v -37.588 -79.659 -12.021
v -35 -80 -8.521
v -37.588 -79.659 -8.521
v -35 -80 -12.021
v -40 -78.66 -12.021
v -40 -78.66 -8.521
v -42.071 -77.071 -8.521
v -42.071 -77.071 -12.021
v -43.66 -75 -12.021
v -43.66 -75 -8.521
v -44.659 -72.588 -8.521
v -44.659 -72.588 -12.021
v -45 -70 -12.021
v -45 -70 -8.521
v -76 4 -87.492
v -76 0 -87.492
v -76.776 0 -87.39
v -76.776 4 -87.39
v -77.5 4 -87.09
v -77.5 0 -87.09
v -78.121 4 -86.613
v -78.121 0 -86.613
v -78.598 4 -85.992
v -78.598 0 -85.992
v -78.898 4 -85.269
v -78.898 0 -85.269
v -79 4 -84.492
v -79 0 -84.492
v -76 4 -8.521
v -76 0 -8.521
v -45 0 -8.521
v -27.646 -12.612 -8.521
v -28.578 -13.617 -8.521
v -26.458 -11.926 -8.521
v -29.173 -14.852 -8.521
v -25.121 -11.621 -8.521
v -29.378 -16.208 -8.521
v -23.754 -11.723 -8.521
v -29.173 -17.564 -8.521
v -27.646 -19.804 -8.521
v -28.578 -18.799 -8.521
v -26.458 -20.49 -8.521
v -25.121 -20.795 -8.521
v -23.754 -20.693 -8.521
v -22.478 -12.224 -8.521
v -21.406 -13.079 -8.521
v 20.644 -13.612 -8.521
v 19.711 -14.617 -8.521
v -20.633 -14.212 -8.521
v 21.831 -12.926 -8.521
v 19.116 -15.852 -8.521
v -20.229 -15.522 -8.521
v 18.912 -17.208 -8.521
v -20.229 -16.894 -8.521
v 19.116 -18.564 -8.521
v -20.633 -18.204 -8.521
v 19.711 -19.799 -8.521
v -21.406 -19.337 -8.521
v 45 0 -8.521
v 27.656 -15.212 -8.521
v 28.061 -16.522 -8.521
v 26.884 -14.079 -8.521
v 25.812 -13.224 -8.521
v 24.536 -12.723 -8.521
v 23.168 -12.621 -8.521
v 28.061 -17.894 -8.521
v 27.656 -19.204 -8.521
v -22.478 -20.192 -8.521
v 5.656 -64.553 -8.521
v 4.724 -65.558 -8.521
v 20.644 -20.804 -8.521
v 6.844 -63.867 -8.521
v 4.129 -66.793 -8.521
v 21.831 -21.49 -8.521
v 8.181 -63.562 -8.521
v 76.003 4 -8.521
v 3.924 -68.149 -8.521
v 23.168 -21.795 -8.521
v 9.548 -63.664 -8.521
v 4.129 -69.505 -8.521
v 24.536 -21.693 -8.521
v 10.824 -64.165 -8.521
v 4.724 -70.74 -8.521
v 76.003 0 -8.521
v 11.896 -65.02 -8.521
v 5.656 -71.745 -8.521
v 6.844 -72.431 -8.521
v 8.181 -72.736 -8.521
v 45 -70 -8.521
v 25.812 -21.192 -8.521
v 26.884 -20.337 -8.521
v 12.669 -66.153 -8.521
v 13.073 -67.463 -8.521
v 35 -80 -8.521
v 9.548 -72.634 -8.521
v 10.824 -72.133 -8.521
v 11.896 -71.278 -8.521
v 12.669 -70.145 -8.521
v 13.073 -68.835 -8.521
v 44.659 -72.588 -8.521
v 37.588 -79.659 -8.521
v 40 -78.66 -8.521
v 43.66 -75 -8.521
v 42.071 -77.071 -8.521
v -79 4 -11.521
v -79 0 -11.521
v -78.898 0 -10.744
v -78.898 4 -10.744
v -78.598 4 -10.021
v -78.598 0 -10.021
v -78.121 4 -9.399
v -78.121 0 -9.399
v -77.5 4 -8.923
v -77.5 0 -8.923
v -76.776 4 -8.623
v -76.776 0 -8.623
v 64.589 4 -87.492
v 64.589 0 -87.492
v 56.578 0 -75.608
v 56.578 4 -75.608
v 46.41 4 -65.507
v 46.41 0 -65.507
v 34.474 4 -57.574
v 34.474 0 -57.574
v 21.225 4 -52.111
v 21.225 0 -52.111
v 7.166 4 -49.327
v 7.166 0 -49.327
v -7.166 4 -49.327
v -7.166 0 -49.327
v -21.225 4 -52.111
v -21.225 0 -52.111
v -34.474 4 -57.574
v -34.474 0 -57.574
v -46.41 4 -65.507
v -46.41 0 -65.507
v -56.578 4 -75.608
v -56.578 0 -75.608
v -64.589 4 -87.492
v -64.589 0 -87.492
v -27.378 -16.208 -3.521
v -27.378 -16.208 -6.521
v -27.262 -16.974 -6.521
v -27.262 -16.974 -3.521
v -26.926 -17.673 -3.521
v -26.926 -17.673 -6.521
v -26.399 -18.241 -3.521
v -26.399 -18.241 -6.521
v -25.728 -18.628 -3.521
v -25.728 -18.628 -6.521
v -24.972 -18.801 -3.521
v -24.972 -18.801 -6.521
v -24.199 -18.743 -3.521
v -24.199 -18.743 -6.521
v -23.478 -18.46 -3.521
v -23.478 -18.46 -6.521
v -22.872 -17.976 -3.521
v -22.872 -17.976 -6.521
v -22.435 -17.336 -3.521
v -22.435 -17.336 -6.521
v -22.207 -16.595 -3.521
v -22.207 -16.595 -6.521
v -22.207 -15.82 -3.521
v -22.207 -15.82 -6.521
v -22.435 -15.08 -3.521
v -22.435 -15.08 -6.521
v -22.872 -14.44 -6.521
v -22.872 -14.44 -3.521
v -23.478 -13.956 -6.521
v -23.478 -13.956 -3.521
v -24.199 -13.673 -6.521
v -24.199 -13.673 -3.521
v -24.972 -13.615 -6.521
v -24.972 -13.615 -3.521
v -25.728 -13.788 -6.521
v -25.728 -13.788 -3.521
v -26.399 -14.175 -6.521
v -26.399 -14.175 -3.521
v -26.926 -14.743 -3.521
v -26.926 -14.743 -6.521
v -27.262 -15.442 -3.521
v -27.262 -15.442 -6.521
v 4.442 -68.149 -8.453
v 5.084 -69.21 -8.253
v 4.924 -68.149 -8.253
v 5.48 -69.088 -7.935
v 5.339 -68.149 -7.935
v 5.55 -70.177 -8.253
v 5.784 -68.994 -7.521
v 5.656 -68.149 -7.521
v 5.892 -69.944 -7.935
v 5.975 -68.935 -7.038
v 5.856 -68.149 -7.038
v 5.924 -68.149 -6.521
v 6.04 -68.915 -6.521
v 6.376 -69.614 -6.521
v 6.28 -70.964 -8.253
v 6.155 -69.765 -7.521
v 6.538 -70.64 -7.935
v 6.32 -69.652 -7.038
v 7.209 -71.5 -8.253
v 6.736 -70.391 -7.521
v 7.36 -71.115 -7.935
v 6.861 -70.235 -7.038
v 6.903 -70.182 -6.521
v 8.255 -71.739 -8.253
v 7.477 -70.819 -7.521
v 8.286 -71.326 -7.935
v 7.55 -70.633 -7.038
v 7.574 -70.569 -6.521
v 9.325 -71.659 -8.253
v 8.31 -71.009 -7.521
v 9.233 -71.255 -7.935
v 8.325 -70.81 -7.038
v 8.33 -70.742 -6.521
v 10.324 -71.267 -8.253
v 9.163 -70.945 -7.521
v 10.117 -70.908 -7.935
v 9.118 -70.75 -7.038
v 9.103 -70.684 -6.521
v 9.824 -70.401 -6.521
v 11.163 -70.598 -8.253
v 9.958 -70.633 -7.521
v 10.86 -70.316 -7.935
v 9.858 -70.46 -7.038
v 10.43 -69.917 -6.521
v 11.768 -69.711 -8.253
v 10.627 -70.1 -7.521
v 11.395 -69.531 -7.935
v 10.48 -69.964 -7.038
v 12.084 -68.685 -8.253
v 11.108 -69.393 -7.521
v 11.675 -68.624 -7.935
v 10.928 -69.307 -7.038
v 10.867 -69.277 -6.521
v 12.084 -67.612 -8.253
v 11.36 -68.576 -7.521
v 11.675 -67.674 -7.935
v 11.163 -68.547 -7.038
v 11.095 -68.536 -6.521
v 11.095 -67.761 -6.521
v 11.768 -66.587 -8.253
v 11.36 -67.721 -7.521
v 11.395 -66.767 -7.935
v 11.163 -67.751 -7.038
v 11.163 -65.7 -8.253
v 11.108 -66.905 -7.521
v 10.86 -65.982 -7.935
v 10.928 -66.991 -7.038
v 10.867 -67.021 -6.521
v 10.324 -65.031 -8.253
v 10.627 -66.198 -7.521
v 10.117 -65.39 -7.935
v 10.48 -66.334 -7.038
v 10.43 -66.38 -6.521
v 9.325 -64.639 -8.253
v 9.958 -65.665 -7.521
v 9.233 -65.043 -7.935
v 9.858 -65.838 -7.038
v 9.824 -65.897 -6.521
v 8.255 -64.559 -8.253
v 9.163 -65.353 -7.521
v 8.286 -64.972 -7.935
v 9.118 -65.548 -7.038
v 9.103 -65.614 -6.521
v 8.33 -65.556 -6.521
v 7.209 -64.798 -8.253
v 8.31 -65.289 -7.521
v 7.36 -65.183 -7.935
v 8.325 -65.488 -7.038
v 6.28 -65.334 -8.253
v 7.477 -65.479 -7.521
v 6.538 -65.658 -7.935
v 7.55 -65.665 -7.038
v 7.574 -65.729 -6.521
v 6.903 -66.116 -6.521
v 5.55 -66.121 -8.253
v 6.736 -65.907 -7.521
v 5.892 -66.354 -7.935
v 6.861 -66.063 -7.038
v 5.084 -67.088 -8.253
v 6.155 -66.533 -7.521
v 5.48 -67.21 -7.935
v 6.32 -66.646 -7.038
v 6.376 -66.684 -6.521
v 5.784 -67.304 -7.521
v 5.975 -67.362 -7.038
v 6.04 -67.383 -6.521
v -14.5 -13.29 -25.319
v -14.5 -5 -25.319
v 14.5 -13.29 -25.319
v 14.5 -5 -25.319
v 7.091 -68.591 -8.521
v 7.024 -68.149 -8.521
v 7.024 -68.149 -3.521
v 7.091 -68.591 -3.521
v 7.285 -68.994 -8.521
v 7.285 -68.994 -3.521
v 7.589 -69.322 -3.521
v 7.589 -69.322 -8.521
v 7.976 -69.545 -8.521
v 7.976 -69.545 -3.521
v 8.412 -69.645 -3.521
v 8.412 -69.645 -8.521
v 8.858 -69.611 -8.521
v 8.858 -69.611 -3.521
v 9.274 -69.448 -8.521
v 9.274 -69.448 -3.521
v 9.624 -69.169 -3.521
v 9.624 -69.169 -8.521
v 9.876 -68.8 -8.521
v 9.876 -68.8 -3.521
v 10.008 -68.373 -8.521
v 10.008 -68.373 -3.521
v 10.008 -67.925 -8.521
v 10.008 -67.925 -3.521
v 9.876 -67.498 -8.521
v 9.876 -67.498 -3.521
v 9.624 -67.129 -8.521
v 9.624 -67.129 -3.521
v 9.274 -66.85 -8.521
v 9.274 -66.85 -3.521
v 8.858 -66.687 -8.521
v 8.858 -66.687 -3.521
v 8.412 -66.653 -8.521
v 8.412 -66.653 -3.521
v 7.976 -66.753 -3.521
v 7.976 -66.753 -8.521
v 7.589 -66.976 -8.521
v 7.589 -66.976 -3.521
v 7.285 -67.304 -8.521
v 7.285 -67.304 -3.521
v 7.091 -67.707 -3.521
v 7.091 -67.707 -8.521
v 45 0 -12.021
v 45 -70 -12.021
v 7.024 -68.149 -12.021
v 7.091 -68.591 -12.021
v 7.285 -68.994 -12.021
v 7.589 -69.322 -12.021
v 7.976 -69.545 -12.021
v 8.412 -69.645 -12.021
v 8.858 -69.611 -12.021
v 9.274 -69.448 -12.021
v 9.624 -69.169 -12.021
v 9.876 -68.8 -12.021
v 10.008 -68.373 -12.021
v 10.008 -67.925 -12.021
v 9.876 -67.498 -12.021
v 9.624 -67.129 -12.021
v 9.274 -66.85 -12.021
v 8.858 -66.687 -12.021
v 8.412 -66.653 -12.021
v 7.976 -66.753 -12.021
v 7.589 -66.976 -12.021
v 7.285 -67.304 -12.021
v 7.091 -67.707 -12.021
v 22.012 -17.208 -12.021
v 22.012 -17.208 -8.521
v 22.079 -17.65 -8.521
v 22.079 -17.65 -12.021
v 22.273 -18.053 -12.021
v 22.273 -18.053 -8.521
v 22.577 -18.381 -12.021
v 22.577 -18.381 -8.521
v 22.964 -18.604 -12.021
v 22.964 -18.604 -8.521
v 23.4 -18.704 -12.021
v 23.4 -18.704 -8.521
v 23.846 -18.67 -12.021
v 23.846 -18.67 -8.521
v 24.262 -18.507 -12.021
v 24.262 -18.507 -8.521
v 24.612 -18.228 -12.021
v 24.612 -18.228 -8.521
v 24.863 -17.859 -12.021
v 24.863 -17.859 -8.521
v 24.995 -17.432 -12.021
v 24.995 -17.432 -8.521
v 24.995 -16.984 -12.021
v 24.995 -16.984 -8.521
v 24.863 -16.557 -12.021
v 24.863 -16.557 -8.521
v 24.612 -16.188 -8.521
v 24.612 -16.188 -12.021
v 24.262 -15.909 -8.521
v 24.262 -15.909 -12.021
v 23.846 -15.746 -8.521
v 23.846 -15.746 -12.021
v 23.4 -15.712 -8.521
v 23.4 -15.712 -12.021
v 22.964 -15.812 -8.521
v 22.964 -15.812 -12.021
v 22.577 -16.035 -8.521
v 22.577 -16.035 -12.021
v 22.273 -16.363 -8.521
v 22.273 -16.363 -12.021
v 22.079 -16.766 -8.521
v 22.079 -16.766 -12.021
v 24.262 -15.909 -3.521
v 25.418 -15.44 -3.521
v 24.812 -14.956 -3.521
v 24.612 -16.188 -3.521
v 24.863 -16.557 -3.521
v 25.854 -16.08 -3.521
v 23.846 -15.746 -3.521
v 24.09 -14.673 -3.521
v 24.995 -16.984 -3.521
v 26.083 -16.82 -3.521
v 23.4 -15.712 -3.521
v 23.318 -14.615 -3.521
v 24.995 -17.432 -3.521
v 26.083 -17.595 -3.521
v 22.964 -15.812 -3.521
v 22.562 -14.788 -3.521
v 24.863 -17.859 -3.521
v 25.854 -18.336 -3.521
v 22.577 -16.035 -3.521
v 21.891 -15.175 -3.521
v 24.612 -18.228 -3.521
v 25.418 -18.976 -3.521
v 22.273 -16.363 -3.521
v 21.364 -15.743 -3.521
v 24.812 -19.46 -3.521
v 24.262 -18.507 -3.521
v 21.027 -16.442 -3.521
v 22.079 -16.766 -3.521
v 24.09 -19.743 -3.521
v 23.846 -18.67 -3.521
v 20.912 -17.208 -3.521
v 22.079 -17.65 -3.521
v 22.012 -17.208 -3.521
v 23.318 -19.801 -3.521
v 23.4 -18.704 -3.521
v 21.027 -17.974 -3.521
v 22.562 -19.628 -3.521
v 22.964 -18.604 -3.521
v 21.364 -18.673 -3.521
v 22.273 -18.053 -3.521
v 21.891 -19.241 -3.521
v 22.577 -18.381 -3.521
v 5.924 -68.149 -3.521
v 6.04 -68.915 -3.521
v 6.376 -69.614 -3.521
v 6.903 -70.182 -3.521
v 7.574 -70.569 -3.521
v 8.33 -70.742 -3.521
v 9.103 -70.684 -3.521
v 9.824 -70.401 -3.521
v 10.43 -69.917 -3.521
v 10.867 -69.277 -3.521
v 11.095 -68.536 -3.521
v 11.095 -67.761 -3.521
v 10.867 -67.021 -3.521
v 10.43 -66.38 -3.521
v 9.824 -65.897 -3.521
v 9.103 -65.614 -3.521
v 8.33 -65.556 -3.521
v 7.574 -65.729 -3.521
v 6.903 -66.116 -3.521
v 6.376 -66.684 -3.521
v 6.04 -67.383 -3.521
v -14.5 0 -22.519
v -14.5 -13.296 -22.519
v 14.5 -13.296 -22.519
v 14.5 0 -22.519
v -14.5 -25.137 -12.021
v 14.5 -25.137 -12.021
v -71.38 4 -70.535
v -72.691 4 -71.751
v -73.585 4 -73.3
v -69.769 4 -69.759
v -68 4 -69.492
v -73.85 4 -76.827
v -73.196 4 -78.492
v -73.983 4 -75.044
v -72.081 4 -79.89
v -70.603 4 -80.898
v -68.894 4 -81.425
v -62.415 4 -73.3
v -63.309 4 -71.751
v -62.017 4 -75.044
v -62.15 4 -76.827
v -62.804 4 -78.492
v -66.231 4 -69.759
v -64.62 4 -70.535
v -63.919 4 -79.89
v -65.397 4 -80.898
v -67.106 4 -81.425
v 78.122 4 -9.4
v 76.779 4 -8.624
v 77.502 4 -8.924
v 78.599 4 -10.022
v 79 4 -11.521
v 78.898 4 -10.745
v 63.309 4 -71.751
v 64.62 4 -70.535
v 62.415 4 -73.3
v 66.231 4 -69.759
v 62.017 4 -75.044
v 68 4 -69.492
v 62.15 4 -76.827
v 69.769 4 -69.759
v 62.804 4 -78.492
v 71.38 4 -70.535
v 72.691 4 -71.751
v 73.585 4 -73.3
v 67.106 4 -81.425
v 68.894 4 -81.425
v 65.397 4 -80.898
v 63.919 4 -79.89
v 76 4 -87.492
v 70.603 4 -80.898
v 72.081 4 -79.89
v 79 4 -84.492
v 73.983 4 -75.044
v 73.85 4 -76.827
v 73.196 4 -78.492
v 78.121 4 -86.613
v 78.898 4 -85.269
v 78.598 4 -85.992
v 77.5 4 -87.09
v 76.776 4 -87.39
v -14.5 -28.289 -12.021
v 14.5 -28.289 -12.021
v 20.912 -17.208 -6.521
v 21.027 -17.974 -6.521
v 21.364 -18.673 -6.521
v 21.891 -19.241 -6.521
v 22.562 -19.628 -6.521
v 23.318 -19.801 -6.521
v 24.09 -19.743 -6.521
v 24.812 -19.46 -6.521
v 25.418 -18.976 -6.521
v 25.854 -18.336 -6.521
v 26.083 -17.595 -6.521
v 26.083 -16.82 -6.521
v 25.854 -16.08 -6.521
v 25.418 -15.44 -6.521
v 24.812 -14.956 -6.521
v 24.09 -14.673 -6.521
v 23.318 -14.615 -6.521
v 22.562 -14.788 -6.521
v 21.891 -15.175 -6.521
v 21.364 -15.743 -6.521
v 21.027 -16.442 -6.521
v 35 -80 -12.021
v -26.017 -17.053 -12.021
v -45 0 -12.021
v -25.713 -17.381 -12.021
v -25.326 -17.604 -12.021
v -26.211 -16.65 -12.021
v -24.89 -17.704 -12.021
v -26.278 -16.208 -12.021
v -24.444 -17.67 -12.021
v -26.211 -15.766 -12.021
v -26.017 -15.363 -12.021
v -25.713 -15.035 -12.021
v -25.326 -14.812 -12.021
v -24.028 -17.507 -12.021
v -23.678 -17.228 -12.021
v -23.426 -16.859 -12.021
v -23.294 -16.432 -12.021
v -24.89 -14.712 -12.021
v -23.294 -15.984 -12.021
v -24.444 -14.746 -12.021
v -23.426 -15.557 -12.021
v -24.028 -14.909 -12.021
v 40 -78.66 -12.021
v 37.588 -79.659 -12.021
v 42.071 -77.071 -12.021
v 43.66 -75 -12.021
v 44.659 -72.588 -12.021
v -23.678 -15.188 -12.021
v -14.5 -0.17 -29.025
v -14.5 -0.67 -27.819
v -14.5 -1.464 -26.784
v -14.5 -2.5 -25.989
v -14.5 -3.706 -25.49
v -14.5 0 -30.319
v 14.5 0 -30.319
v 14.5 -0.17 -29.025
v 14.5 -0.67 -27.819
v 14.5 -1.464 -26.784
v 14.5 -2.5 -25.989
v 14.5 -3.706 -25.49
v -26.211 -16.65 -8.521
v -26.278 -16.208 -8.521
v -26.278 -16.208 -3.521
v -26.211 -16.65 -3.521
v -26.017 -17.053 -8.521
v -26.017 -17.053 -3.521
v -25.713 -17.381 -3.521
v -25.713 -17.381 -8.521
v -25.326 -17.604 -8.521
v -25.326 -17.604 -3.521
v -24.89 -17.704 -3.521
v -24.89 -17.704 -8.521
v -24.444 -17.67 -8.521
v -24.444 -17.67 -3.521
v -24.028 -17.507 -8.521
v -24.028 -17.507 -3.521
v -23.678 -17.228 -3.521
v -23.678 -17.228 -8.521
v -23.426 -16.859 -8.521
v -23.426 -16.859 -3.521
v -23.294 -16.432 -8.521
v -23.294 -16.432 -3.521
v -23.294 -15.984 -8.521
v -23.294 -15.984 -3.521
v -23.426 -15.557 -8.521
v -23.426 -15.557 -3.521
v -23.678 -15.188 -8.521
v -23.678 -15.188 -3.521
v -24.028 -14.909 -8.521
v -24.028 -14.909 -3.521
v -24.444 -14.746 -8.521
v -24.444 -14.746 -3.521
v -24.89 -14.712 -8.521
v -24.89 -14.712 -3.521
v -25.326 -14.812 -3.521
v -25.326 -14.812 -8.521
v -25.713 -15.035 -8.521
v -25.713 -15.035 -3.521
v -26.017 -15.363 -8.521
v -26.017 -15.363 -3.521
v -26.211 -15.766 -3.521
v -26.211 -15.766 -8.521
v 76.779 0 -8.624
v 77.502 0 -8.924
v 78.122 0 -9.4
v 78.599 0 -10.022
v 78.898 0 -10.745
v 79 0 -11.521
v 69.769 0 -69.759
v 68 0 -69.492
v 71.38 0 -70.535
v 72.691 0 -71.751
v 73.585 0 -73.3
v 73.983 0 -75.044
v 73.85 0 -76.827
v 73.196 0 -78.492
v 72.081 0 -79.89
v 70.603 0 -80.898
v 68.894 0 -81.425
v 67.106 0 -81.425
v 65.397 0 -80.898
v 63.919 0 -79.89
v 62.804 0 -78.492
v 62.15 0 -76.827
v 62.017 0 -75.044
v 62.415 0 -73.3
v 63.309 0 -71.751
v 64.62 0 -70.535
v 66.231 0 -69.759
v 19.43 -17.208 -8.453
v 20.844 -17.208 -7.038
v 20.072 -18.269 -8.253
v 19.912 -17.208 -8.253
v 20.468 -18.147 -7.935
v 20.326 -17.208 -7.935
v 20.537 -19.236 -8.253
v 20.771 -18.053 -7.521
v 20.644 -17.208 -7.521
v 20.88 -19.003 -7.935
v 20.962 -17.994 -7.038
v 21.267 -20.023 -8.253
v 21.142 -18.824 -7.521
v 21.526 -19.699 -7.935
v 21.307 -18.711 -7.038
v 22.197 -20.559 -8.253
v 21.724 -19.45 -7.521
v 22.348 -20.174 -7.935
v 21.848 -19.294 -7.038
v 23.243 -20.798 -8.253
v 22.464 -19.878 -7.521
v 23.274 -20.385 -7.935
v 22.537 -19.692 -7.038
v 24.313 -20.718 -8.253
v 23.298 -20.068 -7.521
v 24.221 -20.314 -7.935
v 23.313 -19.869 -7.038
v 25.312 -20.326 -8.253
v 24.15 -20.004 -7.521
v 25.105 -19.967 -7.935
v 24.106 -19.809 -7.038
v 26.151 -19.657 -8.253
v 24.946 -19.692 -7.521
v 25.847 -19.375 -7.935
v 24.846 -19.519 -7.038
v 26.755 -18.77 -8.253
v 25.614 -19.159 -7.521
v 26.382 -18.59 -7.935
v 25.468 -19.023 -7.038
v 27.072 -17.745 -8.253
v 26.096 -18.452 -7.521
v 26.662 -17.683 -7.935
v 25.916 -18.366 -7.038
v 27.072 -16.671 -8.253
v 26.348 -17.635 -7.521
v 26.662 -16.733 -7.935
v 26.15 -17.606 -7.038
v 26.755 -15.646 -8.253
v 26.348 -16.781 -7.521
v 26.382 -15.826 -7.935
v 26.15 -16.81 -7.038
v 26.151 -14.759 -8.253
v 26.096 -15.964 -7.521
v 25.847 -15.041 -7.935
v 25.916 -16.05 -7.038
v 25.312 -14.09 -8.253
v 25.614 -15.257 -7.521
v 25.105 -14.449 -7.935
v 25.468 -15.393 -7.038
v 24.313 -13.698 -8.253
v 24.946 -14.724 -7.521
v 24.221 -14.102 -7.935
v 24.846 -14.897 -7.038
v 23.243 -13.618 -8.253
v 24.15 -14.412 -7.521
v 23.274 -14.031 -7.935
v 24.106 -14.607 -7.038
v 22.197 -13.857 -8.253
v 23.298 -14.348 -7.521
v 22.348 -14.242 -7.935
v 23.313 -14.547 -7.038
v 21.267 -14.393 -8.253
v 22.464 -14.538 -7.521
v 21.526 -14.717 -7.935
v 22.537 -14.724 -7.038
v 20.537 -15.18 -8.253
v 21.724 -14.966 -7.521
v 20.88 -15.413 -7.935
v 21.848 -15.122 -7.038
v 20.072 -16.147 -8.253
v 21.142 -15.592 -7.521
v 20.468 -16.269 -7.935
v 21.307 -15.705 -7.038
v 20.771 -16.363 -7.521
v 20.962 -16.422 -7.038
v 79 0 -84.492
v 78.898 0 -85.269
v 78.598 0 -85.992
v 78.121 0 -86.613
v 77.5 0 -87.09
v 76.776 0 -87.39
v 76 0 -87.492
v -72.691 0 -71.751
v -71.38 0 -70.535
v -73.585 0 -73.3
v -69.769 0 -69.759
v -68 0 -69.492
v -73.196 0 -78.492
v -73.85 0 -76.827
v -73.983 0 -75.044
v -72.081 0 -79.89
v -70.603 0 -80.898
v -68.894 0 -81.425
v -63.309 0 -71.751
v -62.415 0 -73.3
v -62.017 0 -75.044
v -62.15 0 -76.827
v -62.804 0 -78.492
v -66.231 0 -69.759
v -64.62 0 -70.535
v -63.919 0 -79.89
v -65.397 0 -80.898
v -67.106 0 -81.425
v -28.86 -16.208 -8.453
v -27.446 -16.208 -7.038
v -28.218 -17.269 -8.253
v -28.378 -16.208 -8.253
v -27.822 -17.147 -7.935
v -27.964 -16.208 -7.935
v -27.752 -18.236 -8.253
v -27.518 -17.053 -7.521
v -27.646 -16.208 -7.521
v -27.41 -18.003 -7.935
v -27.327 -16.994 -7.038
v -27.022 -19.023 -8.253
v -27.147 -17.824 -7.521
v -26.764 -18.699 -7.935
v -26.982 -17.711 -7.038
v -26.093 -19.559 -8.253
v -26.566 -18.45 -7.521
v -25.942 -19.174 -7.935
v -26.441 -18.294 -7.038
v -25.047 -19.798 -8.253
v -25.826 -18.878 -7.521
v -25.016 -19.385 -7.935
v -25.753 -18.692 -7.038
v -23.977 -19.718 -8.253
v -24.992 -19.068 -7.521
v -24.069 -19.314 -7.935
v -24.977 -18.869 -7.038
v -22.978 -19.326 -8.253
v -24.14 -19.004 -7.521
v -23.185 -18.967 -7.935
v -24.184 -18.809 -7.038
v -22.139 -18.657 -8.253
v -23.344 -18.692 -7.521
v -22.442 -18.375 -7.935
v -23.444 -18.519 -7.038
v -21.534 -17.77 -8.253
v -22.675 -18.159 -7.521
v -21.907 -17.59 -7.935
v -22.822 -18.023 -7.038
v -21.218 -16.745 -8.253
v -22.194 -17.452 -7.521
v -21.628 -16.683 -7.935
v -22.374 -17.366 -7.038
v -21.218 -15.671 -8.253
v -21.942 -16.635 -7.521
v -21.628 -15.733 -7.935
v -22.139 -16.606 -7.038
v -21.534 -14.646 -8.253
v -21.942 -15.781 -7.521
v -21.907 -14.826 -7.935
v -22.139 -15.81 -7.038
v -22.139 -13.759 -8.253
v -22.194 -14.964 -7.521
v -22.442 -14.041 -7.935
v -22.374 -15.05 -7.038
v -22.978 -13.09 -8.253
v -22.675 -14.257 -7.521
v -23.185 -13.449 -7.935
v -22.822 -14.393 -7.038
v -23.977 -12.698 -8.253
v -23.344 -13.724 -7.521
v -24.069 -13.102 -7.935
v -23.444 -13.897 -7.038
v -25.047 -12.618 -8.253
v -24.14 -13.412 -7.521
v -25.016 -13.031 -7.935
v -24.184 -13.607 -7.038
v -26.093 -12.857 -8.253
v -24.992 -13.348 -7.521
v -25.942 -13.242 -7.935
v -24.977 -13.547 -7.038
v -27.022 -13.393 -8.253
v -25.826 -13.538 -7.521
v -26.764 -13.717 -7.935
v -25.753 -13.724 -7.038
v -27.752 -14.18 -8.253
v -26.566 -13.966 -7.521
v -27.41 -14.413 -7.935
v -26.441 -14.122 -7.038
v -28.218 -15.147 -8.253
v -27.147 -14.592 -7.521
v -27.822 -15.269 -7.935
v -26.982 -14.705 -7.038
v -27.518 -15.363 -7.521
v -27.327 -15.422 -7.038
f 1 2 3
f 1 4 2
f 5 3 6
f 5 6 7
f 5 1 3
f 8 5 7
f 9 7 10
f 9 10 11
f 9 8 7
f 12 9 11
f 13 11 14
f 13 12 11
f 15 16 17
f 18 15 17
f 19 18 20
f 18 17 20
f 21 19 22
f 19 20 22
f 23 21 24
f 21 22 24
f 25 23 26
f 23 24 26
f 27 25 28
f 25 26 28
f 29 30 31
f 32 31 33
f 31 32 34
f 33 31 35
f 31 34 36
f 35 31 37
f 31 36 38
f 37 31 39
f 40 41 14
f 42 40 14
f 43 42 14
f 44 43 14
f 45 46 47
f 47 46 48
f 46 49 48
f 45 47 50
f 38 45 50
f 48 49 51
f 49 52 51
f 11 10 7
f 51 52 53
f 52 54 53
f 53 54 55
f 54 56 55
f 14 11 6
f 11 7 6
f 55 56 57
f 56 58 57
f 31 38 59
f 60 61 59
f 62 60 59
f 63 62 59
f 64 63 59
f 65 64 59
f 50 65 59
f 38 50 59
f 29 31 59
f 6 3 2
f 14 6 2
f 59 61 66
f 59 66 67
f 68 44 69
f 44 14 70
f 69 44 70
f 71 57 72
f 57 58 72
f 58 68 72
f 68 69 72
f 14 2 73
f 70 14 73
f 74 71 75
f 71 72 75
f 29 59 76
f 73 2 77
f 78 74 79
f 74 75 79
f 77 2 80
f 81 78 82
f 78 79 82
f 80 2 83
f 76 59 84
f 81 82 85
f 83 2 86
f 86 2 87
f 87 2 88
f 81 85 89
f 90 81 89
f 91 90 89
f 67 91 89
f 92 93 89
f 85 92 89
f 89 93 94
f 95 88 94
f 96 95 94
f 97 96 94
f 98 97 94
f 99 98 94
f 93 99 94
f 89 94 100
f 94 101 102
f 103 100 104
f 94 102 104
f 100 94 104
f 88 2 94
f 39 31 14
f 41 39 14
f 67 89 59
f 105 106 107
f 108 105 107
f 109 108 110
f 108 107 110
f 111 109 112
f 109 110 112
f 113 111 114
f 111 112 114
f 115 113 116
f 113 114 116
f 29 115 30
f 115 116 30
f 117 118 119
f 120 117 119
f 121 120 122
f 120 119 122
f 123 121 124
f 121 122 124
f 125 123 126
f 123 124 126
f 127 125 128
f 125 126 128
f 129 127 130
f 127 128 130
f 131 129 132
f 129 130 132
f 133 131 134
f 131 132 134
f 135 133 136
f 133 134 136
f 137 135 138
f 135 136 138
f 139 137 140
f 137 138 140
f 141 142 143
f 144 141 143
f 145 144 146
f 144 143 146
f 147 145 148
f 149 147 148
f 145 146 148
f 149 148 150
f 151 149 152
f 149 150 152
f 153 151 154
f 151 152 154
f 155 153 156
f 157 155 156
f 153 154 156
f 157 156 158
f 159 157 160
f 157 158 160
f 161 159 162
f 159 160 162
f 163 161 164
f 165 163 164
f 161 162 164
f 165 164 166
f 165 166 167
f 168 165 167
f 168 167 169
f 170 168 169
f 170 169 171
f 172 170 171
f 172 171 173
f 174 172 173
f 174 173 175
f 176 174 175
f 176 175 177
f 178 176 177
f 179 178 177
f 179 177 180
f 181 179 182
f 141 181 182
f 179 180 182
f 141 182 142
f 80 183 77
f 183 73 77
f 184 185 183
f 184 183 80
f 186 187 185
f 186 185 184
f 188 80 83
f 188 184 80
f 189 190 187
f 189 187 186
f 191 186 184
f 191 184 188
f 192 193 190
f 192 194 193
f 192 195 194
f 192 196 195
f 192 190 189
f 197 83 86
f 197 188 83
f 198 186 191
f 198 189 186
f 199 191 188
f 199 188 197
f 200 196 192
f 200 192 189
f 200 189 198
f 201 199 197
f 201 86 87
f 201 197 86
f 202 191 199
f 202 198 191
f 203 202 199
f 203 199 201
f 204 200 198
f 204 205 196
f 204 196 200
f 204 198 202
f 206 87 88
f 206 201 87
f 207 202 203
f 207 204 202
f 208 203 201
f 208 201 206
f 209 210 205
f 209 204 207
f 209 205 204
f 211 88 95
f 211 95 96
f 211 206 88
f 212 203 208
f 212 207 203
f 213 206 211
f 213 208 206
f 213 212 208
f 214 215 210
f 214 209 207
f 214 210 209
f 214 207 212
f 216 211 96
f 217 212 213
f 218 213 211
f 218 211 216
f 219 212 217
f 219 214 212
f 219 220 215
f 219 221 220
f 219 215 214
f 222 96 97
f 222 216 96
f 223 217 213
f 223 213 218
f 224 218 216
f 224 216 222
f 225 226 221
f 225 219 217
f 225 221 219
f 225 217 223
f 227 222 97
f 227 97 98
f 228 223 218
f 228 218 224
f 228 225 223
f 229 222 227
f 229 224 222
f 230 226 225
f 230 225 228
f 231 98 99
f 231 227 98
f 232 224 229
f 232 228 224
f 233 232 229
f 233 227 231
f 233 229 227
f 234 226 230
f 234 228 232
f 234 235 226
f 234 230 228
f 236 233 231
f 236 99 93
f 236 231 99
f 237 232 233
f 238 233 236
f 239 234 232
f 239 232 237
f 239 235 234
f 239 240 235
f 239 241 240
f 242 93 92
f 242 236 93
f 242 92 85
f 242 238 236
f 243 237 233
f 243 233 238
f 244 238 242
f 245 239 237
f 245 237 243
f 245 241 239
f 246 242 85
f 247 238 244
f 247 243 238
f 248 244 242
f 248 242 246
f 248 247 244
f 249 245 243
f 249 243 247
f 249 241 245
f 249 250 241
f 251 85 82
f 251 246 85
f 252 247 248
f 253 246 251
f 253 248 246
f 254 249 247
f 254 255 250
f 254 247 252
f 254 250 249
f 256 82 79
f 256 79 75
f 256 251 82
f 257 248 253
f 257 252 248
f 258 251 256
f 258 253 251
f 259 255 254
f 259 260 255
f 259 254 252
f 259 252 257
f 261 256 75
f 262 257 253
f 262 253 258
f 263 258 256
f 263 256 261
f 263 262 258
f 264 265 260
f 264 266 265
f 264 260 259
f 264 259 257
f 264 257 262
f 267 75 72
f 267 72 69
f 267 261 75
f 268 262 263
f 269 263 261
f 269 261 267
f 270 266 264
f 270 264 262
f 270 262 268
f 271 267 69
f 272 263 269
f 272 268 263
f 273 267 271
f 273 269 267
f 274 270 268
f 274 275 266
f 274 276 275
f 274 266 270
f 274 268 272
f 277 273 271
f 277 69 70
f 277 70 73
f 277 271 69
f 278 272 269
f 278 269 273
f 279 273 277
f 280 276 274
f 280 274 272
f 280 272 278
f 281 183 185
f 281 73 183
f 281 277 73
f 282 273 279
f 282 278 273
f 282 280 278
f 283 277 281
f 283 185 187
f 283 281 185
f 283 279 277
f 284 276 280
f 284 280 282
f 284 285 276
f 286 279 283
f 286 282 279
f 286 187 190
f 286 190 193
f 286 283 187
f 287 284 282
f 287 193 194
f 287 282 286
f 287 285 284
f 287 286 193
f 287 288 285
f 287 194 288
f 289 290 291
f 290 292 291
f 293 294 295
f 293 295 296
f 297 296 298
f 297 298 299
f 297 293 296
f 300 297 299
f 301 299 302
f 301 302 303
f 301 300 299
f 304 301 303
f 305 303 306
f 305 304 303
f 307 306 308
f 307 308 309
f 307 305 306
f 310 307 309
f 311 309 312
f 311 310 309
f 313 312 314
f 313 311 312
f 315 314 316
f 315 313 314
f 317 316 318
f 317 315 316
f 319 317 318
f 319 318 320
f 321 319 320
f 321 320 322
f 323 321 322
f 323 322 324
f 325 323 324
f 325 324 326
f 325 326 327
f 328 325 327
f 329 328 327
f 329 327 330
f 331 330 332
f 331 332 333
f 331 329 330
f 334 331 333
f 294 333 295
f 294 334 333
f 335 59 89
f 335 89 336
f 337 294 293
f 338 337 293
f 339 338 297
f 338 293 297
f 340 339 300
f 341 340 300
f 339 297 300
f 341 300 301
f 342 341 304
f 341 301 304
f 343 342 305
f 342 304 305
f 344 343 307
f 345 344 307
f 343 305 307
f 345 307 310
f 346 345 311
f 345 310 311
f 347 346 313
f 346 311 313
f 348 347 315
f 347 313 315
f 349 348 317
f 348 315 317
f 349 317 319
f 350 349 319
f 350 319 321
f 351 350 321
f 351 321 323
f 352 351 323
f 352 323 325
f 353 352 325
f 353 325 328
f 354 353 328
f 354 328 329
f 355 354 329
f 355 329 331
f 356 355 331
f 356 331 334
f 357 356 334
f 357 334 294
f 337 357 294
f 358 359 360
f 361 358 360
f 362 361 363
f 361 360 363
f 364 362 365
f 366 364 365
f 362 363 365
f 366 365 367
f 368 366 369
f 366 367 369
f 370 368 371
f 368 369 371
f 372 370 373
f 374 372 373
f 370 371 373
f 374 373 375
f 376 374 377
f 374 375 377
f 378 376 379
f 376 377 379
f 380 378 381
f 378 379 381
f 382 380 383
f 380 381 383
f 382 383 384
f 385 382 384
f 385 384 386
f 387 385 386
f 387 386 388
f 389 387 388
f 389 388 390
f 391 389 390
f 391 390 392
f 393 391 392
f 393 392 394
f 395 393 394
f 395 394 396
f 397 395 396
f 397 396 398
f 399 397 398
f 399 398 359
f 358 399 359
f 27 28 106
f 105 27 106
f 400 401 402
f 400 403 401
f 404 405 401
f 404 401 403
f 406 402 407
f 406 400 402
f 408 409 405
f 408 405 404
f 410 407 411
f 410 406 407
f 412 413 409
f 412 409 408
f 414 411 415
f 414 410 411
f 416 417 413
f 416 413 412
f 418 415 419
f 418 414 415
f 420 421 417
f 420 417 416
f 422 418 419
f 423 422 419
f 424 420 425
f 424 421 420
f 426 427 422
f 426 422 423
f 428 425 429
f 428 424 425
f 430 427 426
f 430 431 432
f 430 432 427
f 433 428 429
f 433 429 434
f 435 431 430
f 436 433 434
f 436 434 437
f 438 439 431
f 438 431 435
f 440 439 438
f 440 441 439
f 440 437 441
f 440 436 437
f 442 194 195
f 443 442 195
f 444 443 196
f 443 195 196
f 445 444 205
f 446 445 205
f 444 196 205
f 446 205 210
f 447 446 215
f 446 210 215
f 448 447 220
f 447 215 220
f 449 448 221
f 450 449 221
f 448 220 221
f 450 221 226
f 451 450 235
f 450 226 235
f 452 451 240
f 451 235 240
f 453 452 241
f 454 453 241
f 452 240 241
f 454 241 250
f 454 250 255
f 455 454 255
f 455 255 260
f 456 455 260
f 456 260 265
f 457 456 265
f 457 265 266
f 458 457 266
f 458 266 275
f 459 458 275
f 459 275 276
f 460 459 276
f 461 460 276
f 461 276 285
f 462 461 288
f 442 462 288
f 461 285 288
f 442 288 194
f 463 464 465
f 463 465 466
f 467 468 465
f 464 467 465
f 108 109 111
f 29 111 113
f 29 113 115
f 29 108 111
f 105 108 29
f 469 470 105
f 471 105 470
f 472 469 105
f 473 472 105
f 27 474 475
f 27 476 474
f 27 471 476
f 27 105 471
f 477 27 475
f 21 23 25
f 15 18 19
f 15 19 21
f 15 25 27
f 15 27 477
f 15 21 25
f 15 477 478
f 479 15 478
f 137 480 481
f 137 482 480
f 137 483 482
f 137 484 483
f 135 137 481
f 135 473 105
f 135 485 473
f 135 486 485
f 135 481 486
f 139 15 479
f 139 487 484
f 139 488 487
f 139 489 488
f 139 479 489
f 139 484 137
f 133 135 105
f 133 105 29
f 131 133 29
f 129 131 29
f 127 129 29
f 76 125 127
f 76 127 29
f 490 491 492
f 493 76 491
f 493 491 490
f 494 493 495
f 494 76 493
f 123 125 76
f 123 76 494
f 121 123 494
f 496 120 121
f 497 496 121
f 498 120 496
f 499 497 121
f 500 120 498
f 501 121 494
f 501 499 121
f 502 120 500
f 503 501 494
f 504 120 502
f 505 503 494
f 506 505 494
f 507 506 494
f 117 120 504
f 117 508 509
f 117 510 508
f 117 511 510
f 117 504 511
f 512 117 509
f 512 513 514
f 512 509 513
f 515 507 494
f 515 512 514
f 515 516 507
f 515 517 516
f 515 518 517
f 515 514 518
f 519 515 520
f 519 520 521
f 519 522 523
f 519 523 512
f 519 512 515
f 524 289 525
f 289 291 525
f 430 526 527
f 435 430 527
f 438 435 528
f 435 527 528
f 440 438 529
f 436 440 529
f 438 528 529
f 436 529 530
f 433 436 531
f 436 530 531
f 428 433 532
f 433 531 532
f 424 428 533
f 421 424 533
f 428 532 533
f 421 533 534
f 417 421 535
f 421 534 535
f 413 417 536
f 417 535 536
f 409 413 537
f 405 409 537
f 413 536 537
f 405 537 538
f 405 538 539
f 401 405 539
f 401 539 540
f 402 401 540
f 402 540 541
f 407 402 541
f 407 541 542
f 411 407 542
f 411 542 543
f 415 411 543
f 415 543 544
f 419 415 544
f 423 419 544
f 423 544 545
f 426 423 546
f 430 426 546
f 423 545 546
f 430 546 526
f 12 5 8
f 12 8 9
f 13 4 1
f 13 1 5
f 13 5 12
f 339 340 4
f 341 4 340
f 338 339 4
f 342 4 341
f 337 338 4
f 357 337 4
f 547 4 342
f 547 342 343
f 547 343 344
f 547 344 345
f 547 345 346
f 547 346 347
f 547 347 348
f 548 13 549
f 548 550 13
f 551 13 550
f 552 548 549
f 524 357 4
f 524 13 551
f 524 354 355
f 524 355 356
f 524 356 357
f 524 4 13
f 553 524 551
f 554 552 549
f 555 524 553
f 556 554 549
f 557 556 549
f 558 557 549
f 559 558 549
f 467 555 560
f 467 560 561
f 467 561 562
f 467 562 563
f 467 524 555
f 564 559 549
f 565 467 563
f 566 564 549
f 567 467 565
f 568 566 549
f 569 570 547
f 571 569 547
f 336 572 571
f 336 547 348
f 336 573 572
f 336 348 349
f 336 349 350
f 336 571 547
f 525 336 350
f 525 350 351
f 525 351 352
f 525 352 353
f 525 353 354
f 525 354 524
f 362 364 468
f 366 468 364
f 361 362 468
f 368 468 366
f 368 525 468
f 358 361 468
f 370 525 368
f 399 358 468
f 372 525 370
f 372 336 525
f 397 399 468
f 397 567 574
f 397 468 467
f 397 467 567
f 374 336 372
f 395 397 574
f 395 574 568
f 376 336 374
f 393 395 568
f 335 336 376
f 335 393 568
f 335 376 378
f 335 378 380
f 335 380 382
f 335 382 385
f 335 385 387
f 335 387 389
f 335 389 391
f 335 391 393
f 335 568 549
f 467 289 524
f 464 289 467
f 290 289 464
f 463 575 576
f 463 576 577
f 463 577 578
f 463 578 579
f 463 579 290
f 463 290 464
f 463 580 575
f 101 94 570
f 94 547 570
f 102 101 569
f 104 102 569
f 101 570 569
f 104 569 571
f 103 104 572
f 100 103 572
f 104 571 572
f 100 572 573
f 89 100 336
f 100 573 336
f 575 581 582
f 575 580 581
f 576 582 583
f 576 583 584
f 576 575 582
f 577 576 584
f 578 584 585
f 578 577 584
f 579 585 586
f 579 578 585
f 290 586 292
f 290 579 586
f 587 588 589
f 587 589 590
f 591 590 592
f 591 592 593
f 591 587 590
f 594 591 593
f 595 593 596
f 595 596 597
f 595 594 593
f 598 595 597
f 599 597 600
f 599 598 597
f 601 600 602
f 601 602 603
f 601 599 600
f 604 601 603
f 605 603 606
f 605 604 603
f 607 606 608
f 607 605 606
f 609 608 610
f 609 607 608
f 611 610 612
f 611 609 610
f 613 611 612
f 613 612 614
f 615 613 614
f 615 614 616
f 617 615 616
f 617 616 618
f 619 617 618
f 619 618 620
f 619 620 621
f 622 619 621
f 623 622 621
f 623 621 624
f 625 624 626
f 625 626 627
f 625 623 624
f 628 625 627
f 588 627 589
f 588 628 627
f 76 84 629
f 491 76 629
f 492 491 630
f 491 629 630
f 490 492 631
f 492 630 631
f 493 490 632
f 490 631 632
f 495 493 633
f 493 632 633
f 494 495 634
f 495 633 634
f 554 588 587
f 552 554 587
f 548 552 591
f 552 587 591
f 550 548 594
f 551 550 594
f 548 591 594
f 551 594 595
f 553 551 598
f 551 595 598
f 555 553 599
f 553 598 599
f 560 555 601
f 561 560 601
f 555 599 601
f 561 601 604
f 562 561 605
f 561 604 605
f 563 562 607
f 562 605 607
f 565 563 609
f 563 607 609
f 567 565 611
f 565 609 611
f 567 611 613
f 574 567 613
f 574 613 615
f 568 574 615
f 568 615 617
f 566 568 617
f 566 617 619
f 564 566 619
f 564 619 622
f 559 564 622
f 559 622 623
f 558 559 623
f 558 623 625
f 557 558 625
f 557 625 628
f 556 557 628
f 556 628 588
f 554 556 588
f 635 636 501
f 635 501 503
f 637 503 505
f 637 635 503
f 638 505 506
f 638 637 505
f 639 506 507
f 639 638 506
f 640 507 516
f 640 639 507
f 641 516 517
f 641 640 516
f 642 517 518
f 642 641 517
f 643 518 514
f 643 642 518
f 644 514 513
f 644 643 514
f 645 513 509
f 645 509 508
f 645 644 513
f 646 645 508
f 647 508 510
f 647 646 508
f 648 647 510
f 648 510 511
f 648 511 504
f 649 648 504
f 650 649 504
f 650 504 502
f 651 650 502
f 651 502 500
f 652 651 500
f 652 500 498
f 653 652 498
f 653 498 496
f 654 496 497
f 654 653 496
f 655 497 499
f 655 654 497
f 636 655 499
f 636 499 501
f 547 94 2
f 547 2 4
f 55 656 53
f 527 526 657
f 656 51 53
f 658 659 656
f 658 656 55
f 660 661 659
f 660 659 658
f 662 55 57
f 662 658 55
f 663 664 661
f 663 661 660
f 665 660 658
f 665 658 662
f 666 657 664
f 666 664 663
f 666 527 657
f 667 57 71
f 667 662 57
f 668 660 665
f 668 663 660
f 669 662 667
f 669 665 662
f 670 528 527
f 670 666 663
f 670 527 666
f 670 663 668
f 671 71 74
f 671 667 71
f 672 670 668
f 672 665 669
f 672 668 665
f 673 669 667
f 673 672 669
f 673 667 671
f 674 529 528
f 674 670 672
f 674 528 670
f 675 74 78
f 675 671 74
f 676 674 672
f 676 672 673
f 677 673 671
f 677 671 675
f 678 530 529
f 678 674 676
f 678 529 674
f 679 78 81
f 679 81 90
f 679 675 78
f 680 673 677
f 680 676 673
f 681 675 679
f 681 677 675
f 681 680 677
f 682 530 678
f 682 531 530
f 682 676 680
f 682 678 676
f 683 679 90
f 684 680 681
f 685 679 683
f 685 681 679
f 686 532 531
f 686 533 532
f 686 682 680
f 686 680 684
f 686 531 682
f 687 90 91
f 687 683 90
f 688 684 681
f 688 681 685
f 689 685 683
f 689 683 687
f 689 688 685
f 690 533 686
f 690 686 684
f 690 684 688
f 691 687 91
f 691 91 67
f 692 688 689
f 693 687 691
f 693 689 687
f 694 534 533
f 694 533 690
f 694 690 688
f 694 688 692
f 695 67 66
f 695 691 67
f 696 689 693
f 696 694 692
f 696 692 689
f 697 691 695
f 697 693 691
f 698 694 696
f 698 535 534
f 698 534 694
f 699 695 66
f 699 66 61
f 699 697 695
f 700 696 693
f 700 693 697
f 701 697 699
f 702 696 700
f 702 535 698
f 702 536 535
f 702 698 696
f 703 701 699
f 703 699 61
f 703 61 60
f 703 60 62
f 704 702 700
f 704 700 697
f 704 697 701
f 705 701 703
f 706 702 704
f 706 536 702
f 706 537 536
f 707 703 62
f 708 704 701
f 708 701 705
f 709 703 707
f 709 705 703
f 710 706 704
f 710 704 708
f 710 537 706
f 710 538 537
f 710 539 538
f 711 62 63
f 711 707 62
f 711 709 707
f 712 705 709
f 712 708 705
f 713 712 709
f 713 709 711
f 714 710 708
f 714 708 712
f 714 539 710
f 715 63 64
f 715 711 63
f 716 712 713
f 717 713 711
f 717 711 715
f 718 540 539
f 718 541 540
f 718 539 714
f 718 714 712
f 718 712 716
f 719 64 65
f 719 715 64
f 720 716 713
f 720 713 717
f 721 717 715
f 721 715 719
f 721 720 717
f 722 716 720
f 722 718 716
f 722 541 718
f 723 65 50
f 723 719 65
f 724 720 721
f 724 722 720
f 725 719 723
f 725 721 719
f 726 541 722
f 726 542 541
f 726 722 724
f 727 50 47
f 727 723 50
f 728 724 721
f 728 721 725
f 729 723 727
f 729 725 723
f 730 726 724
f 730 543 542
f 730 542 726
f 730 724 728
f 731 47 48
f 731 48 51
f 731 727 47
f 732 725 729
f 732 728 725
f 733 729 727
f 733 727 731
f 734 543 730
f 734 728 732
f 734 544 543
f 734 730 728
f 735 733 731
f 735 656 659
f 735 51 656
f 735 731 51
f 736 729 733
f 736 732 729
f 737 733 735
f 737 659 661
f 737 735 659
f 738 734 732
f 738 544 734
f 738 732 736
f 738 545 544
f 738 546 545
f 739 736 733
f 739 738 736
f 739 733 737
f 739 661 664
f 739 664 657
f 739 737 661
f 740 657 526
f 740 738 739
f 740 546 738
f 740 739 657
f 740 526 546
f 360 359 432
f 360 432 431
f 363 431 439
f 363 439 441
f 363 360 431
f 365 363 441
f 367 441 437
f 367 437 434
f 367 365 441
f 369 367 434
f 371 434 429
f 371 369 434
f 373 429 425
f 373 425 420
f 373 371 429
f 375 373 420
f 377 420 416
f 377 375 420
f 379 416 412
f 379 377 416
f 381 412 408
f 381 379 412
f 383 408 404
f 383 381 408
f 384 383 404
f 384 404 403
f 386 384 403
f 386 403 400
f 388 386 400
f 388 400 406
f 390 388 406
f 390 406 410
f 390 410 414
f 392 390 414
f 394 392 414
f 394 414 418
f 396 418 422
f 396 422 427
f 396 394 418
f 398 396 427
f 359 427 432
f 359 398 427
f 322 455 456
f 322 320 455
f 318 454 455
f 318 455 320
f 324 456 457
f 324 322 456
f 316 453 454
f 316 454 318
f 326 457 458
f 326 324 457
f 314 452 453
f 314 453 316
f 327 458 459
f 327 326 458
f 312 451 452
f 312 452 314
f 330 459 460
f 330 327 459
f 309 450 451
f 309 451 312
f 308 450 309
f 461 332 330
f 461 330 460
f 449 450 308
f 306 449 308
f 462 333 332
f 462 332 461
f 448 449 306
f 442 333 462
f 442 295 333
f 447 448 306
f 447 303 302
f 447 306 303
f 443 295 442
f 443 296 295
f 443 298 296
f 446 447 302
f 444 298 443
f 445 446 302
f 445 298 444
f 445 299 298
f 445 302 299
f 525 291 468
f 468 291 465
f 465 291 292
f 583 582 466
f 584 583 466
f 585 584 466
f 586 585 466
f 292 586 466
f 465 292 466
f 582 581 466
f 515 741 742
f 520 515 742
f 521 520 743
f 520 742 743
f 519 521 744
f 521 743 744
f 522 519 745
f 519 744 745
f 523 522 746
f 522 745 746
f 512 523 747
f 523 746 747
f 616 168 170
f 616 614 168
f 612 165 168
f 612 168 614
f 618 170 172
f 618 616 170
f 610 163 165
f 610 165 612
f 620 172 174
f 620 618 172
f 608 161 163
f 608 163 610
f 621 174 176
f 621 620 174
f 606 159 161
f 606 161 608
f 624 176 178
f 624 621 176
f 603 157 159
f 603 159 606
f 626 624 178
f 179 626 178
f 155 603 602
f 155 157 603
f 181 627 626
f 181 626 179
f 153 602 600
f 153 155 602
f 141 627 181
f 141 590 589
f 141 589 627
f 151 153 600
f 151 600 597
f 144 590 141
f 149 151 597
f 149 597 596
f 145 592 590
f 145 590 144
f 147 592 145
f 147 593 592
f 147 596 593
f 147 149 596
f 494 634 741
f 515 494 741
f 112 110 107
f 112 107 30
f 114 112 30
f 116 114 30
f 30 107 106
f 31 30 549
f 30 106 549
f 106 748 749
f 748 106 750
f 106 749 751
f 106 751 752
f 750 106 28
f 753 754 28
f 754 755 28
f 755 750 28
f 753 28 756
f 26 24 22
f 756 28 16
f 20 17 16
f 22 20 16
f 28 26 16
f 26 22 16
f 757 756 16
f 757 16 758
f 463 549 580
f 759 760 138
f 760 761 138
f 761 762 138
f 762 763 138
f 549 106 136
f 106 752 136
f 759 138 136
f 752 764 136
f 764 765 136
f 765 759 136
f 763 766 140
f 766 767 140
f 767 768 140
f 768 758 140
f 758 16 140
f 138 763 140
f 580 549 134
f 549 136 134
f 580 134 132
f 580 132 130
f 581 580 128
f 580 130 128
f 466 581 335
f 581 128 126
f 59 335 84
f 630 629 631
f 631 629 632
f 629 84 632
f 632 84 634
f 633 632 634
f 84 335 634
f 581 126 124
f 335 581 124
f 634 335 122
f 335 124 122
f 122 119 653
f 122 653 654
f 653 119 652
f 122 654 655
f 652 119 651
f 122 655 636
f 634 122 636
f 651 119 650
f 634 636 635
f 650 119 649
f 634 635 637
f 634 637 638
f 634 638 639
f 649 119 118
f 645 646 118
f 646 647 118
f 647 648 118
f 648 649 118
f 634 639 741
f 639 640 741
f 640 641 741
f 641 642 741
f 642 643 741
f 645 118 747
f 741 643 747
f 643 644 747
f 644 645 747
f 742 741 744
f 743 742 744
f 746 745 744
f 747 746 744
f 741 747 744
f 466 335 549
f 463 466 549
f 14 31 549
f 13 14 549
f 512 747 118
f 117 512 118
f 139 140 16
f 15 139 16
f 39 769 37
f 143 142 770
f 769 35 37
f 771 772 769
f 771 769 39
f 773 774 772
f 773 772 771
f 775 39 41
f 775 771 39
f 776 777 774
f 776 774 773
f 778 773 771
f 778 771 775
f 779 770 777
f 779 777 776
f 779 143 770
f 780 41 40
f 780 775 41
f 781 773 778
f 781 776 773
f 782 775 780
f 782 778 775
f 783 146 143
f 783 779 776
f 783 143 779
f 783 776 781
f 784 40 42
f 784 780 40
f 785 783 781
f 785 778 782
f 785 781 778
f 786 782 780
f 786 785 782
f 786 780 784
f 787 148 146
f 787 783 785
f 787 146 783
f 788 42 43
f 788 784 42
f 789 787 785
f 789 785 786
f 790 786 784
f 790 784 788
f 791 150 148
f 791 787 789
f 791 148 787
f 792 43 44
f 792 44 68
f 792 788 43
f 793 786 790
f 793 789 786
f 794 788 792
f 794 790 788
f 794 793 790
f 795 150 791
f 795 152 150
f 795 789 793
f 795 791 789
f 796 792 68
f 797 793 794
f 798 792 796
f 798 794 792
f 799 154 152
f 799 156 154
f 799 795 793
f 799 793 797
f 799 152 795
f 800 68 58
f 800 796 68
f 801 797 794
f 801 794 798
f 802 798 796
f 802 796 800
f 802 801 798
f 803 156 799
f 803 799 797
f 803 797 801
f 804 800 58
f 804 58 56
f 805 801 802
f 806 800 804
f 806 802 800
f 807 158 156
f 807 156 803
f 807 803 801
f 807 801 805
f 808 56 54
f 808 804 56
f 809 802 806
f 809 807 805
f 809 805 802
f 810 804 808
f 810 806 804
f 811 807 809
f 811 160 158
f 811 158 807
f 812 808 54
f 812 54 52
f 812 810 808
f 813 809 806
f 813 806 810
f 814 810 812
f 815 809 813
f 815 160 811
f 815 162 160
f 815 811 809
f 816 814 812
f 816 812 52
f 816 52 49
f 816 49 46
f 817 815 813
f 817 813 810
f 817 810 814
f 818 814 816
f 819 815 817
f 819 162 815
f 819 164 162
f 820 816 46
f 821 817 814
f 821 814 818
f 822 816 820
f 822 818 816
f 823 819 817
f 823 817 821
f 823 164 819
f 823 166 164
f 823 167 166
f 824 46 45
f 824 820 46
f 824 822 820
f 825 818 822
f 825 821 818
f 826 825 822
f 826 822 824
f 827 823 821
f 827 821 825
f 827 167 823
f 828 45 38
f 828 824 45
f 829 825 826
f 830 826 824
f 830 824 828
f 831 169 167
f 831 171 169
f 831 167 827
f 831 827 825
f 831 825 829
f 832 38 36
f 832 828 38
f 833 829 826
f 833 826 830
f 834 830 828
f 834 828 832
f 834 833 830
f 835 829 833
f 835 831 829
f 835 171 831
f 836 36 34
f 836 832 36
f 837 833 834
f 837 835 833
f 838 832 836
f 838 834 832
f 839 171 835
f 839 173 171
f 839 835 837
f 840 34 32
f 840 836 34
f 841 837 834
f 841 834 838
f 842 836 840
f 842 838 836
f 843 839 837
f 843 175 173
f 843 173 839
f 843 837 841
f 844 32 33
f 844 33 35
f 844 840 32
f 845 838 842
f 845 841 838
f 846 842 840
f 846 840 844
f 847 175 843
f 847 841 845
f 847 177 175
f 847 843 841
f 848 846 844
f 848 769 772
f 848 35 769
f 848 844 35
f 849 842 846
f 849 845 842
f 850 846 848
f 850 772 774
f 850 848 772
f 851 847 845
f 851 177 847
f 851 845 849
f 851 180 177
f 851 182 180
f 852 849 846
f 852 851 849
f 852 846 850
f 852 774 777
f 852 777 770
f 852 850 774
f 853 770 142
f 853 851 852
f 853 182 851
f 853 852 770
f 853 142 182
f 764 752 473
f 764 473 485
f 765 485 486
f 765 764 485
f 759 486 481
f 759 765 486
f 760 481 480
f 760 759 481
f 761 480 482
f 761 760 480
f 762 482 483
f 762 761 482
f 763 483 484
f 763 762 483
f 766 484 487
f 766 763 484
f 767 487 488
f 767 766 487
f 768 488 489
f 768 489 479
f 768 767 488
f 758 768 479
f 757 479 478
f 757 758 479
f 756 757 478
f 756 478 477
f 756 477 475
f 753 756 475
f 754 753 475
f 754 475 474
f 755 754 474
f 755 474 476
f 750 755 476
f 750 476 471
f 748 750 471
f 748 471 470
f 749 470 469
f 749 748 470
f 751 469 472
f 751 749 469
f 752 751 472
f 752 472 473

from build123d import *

# Parameters (mm, degrees)
SKETCH_217_R        = 6
EXTRUDE_1_DEPTH     = 4
SKETCH_2_W          = 3.5
SKETCH_2_H          = 80
EXTRUDE_3_DEPTH     = 45
EXTRUDE_4_DEPTH     = 14.5
SKETCH_10_R         = 2.6
SKETCH_10_R_2       = 1.5
EXTRUDE_5_DEPTH     = 5
FILLET_1_R          = 2
FILLET_2_R          = 2
FILLET_3_R          = 10
FILLET_4_R          = 10
FILLET_5_R          = 5
SKETCH_12_R         = 1.5
CUT_EXTRUDE_1_DEPTH = 5


with BuildPart() as part:
    # Sketch 217 → 凸台-拉伸1 (new body)
    with BuildSketch(Plane(origin=(0, 0, 0), x_dir=(1, 0, 0), z_dir=(0, 1, 0))):
        with BuildLine():
            Line((79, 11.520697427), (79, 84.492095777))
            ThreePointArc((79, 84.492095777), (78.121320344, 86.613416121), (76, 87.492095777))
            Line((76, 87.492095777), (64.588699332, 87.492095777))
            ThreePointArc((64.588699332, 87.492095777), (0, 48.976277018), (-64.588699332, 87.492095777))
            Line((-64.588699332, 87.492095777), (-76, 87.492095777))
            ThreePointArc((-76, 87.492095777), (-78.121320344, 86.613416121), (-79, 84.492095777))
            Line((-79, 84.492095777), (-79, 11.520698809))
            ThreePointArc((-79, 11.520698809), (-78.121320344, 9.399378465), (-76, 8.520698809))
            Line((-76, 8.520698809), (76.002879086, 8.520698809))
            ThreePointArc((76.002879086, 8.520698809), (78.12233801, 9.400395239), (79, 11.520697427))
        make_face()
        with Locations(Location((68, 75.492095777, 0), (0, 0, 270))):  # turned: the seam where the file's is
            Circle(SKETCH_217_R, mode=Mode.SUBTRACT)
        with Locations(Location((-68, 75.492095777, 0), (0, 0, 270))):  # turned: the seam where the file's is
            Circle(SKETCH_217_R, mode=Mode.SUBTRACT)
    extrude(amount=EXTRUDE_1_DEPTH)

    # 草图2 → 凸台-拉伸3 (add, symmetric)
    with BuildSketch(Plane(origin=(0, 0, 0), x_dir=(0, 0, -1), z_dir=(1, 0, 0))):
        with Locations((10.270698809, -40)):
            Rectangle(SKETCH_2_W, SKETCH_2_H)
    extrude(amount=EXTRUDE_3_DEPTH, both=True)

    # 草图11 → 凸台-拉伸4 (add, symmetric)
    with BuildSketch(Plane(origin=(0, 0, 0), x_dir=(0, 0, -1), z_dir=(1, 0, 0))):
        Polygon((22.519495234, 0), (25.319495234, 0), (25.319495234, -13.290347232), (12.020698809, -28.288925016), (12.020698809, -25.13708489), (22.519495234, -13.2963882), align=None)
    extrude(amount=EXTRUDE_4_DEPTH, both=True)

    # 草图10 → 凸台-拉伸5 (add)
    with BuildSketch(Plane.XY.offset(-8.520698809)):
        with Locations(Location((23.511926173, -17.207974392, 0), (0, 0, 180))):  # turned: the seam where the file's is
            Circle(SKETCH_10_R)
        with Locations(Location((23.511926173, -17.207974392, 0), (0, 0, 180))):  # turned: the seam where the file's is
            Circle(SKETCH_10_R_2, mode=Mode.SUBTRACT)
        with Locations(Location((-24.77772075, -16.207974392, 0), (0, 0, 180))):  # turned: the seam where the file's is
            Circle(SKETCH_10_R)
        with Locations(Location((-24.77772075, -16.207974392, 0), (0, 0, 180))):  # turned: the seam where the file's is
            Circle(SKETCH_10_R_2, mode=Mode.SUBTRACT)
        with Locations(Location((8.524325101, -68.1489384, 0), (0, 0, 180))):  # turned: the seam where the file's is
            Circle(SKETCH_10_R)
        with Locations(Location((8.524325101, -68.1489384, 0), (0, 0, 180))):  # turned: the seam where the file's is
            Circle(SKETCH_10_R_2, mode=Mode.SUBTRACT)
    extrude(amount=EXTRUDE_5_DEPTH)

    # 圆角1
    fillet_1_edges = [part.edges().sort_by_distance(p)[0] for p in [
        (11.124325101, -68.1489384, -8.520698809),
    ]]
    fillet(fillet_1_edges, radius=FILLET_1_R)

    # 圆角2
    fillet_2_edges = [part.edges().sort_by_distance(p)[0] for p in [
        (26.111926173, -17.207974392, -8.520698809),
        (-22.17772075, -16.207974392, -8.520698809),
    ]]
    fillet(fillet_2_edges, radius=FILLET_2_R)

    # 圆角3
    fillet_3_edges = [part.edges().sort_by_distance(p)[0] for p in [
        (45, -80, -10.270698809),
    ]]
    fillet(fillet_3_edges, radius=FILLET_3_R)

    # 圆角4
    fillet_4_edges = [part.edges().sort_by_distance(p)[0] for p in [
        (-45, -80, -10.270698809),
    ]]
    fillet(fillet_4_edges, radius=FILLET_4_R)

    # 圆角5
    fillet_5_edges = [part.edges().sort_by_distance(p)[0] for p in [
        (0, 0, -25.319495234),
    ]]
    fillet(fillet_5_edges, radius=FILLET_5_R)

    # 草图12 → 切除-拉伸1 (cut)
    with BuildSketch(Plane.XY.offset(-8.520698809)):
        with Locations(Location((-24.77772075, -16.207974392, 0), (0, 0, 180))):  # turned: the seam where the file's is
            Circle(SKETCH_12_R)
        with Locations(Location((23.511926173, -17.207974392, 0), (0, 0, 180))):  # turned: the seam where the file's is
            Circle(SKETCH_12_R)
        with Locations(Location((8.524325101, -68.1489384, 0), (0, 0, 180))):  # turned: the seam where the file's is
            Circle(SKETCH_12_R)
    extrude(amount=-CUT_EXTRUDE_1_DEPTH, mode=Mode.SUBTRACT)


solid = part.part
